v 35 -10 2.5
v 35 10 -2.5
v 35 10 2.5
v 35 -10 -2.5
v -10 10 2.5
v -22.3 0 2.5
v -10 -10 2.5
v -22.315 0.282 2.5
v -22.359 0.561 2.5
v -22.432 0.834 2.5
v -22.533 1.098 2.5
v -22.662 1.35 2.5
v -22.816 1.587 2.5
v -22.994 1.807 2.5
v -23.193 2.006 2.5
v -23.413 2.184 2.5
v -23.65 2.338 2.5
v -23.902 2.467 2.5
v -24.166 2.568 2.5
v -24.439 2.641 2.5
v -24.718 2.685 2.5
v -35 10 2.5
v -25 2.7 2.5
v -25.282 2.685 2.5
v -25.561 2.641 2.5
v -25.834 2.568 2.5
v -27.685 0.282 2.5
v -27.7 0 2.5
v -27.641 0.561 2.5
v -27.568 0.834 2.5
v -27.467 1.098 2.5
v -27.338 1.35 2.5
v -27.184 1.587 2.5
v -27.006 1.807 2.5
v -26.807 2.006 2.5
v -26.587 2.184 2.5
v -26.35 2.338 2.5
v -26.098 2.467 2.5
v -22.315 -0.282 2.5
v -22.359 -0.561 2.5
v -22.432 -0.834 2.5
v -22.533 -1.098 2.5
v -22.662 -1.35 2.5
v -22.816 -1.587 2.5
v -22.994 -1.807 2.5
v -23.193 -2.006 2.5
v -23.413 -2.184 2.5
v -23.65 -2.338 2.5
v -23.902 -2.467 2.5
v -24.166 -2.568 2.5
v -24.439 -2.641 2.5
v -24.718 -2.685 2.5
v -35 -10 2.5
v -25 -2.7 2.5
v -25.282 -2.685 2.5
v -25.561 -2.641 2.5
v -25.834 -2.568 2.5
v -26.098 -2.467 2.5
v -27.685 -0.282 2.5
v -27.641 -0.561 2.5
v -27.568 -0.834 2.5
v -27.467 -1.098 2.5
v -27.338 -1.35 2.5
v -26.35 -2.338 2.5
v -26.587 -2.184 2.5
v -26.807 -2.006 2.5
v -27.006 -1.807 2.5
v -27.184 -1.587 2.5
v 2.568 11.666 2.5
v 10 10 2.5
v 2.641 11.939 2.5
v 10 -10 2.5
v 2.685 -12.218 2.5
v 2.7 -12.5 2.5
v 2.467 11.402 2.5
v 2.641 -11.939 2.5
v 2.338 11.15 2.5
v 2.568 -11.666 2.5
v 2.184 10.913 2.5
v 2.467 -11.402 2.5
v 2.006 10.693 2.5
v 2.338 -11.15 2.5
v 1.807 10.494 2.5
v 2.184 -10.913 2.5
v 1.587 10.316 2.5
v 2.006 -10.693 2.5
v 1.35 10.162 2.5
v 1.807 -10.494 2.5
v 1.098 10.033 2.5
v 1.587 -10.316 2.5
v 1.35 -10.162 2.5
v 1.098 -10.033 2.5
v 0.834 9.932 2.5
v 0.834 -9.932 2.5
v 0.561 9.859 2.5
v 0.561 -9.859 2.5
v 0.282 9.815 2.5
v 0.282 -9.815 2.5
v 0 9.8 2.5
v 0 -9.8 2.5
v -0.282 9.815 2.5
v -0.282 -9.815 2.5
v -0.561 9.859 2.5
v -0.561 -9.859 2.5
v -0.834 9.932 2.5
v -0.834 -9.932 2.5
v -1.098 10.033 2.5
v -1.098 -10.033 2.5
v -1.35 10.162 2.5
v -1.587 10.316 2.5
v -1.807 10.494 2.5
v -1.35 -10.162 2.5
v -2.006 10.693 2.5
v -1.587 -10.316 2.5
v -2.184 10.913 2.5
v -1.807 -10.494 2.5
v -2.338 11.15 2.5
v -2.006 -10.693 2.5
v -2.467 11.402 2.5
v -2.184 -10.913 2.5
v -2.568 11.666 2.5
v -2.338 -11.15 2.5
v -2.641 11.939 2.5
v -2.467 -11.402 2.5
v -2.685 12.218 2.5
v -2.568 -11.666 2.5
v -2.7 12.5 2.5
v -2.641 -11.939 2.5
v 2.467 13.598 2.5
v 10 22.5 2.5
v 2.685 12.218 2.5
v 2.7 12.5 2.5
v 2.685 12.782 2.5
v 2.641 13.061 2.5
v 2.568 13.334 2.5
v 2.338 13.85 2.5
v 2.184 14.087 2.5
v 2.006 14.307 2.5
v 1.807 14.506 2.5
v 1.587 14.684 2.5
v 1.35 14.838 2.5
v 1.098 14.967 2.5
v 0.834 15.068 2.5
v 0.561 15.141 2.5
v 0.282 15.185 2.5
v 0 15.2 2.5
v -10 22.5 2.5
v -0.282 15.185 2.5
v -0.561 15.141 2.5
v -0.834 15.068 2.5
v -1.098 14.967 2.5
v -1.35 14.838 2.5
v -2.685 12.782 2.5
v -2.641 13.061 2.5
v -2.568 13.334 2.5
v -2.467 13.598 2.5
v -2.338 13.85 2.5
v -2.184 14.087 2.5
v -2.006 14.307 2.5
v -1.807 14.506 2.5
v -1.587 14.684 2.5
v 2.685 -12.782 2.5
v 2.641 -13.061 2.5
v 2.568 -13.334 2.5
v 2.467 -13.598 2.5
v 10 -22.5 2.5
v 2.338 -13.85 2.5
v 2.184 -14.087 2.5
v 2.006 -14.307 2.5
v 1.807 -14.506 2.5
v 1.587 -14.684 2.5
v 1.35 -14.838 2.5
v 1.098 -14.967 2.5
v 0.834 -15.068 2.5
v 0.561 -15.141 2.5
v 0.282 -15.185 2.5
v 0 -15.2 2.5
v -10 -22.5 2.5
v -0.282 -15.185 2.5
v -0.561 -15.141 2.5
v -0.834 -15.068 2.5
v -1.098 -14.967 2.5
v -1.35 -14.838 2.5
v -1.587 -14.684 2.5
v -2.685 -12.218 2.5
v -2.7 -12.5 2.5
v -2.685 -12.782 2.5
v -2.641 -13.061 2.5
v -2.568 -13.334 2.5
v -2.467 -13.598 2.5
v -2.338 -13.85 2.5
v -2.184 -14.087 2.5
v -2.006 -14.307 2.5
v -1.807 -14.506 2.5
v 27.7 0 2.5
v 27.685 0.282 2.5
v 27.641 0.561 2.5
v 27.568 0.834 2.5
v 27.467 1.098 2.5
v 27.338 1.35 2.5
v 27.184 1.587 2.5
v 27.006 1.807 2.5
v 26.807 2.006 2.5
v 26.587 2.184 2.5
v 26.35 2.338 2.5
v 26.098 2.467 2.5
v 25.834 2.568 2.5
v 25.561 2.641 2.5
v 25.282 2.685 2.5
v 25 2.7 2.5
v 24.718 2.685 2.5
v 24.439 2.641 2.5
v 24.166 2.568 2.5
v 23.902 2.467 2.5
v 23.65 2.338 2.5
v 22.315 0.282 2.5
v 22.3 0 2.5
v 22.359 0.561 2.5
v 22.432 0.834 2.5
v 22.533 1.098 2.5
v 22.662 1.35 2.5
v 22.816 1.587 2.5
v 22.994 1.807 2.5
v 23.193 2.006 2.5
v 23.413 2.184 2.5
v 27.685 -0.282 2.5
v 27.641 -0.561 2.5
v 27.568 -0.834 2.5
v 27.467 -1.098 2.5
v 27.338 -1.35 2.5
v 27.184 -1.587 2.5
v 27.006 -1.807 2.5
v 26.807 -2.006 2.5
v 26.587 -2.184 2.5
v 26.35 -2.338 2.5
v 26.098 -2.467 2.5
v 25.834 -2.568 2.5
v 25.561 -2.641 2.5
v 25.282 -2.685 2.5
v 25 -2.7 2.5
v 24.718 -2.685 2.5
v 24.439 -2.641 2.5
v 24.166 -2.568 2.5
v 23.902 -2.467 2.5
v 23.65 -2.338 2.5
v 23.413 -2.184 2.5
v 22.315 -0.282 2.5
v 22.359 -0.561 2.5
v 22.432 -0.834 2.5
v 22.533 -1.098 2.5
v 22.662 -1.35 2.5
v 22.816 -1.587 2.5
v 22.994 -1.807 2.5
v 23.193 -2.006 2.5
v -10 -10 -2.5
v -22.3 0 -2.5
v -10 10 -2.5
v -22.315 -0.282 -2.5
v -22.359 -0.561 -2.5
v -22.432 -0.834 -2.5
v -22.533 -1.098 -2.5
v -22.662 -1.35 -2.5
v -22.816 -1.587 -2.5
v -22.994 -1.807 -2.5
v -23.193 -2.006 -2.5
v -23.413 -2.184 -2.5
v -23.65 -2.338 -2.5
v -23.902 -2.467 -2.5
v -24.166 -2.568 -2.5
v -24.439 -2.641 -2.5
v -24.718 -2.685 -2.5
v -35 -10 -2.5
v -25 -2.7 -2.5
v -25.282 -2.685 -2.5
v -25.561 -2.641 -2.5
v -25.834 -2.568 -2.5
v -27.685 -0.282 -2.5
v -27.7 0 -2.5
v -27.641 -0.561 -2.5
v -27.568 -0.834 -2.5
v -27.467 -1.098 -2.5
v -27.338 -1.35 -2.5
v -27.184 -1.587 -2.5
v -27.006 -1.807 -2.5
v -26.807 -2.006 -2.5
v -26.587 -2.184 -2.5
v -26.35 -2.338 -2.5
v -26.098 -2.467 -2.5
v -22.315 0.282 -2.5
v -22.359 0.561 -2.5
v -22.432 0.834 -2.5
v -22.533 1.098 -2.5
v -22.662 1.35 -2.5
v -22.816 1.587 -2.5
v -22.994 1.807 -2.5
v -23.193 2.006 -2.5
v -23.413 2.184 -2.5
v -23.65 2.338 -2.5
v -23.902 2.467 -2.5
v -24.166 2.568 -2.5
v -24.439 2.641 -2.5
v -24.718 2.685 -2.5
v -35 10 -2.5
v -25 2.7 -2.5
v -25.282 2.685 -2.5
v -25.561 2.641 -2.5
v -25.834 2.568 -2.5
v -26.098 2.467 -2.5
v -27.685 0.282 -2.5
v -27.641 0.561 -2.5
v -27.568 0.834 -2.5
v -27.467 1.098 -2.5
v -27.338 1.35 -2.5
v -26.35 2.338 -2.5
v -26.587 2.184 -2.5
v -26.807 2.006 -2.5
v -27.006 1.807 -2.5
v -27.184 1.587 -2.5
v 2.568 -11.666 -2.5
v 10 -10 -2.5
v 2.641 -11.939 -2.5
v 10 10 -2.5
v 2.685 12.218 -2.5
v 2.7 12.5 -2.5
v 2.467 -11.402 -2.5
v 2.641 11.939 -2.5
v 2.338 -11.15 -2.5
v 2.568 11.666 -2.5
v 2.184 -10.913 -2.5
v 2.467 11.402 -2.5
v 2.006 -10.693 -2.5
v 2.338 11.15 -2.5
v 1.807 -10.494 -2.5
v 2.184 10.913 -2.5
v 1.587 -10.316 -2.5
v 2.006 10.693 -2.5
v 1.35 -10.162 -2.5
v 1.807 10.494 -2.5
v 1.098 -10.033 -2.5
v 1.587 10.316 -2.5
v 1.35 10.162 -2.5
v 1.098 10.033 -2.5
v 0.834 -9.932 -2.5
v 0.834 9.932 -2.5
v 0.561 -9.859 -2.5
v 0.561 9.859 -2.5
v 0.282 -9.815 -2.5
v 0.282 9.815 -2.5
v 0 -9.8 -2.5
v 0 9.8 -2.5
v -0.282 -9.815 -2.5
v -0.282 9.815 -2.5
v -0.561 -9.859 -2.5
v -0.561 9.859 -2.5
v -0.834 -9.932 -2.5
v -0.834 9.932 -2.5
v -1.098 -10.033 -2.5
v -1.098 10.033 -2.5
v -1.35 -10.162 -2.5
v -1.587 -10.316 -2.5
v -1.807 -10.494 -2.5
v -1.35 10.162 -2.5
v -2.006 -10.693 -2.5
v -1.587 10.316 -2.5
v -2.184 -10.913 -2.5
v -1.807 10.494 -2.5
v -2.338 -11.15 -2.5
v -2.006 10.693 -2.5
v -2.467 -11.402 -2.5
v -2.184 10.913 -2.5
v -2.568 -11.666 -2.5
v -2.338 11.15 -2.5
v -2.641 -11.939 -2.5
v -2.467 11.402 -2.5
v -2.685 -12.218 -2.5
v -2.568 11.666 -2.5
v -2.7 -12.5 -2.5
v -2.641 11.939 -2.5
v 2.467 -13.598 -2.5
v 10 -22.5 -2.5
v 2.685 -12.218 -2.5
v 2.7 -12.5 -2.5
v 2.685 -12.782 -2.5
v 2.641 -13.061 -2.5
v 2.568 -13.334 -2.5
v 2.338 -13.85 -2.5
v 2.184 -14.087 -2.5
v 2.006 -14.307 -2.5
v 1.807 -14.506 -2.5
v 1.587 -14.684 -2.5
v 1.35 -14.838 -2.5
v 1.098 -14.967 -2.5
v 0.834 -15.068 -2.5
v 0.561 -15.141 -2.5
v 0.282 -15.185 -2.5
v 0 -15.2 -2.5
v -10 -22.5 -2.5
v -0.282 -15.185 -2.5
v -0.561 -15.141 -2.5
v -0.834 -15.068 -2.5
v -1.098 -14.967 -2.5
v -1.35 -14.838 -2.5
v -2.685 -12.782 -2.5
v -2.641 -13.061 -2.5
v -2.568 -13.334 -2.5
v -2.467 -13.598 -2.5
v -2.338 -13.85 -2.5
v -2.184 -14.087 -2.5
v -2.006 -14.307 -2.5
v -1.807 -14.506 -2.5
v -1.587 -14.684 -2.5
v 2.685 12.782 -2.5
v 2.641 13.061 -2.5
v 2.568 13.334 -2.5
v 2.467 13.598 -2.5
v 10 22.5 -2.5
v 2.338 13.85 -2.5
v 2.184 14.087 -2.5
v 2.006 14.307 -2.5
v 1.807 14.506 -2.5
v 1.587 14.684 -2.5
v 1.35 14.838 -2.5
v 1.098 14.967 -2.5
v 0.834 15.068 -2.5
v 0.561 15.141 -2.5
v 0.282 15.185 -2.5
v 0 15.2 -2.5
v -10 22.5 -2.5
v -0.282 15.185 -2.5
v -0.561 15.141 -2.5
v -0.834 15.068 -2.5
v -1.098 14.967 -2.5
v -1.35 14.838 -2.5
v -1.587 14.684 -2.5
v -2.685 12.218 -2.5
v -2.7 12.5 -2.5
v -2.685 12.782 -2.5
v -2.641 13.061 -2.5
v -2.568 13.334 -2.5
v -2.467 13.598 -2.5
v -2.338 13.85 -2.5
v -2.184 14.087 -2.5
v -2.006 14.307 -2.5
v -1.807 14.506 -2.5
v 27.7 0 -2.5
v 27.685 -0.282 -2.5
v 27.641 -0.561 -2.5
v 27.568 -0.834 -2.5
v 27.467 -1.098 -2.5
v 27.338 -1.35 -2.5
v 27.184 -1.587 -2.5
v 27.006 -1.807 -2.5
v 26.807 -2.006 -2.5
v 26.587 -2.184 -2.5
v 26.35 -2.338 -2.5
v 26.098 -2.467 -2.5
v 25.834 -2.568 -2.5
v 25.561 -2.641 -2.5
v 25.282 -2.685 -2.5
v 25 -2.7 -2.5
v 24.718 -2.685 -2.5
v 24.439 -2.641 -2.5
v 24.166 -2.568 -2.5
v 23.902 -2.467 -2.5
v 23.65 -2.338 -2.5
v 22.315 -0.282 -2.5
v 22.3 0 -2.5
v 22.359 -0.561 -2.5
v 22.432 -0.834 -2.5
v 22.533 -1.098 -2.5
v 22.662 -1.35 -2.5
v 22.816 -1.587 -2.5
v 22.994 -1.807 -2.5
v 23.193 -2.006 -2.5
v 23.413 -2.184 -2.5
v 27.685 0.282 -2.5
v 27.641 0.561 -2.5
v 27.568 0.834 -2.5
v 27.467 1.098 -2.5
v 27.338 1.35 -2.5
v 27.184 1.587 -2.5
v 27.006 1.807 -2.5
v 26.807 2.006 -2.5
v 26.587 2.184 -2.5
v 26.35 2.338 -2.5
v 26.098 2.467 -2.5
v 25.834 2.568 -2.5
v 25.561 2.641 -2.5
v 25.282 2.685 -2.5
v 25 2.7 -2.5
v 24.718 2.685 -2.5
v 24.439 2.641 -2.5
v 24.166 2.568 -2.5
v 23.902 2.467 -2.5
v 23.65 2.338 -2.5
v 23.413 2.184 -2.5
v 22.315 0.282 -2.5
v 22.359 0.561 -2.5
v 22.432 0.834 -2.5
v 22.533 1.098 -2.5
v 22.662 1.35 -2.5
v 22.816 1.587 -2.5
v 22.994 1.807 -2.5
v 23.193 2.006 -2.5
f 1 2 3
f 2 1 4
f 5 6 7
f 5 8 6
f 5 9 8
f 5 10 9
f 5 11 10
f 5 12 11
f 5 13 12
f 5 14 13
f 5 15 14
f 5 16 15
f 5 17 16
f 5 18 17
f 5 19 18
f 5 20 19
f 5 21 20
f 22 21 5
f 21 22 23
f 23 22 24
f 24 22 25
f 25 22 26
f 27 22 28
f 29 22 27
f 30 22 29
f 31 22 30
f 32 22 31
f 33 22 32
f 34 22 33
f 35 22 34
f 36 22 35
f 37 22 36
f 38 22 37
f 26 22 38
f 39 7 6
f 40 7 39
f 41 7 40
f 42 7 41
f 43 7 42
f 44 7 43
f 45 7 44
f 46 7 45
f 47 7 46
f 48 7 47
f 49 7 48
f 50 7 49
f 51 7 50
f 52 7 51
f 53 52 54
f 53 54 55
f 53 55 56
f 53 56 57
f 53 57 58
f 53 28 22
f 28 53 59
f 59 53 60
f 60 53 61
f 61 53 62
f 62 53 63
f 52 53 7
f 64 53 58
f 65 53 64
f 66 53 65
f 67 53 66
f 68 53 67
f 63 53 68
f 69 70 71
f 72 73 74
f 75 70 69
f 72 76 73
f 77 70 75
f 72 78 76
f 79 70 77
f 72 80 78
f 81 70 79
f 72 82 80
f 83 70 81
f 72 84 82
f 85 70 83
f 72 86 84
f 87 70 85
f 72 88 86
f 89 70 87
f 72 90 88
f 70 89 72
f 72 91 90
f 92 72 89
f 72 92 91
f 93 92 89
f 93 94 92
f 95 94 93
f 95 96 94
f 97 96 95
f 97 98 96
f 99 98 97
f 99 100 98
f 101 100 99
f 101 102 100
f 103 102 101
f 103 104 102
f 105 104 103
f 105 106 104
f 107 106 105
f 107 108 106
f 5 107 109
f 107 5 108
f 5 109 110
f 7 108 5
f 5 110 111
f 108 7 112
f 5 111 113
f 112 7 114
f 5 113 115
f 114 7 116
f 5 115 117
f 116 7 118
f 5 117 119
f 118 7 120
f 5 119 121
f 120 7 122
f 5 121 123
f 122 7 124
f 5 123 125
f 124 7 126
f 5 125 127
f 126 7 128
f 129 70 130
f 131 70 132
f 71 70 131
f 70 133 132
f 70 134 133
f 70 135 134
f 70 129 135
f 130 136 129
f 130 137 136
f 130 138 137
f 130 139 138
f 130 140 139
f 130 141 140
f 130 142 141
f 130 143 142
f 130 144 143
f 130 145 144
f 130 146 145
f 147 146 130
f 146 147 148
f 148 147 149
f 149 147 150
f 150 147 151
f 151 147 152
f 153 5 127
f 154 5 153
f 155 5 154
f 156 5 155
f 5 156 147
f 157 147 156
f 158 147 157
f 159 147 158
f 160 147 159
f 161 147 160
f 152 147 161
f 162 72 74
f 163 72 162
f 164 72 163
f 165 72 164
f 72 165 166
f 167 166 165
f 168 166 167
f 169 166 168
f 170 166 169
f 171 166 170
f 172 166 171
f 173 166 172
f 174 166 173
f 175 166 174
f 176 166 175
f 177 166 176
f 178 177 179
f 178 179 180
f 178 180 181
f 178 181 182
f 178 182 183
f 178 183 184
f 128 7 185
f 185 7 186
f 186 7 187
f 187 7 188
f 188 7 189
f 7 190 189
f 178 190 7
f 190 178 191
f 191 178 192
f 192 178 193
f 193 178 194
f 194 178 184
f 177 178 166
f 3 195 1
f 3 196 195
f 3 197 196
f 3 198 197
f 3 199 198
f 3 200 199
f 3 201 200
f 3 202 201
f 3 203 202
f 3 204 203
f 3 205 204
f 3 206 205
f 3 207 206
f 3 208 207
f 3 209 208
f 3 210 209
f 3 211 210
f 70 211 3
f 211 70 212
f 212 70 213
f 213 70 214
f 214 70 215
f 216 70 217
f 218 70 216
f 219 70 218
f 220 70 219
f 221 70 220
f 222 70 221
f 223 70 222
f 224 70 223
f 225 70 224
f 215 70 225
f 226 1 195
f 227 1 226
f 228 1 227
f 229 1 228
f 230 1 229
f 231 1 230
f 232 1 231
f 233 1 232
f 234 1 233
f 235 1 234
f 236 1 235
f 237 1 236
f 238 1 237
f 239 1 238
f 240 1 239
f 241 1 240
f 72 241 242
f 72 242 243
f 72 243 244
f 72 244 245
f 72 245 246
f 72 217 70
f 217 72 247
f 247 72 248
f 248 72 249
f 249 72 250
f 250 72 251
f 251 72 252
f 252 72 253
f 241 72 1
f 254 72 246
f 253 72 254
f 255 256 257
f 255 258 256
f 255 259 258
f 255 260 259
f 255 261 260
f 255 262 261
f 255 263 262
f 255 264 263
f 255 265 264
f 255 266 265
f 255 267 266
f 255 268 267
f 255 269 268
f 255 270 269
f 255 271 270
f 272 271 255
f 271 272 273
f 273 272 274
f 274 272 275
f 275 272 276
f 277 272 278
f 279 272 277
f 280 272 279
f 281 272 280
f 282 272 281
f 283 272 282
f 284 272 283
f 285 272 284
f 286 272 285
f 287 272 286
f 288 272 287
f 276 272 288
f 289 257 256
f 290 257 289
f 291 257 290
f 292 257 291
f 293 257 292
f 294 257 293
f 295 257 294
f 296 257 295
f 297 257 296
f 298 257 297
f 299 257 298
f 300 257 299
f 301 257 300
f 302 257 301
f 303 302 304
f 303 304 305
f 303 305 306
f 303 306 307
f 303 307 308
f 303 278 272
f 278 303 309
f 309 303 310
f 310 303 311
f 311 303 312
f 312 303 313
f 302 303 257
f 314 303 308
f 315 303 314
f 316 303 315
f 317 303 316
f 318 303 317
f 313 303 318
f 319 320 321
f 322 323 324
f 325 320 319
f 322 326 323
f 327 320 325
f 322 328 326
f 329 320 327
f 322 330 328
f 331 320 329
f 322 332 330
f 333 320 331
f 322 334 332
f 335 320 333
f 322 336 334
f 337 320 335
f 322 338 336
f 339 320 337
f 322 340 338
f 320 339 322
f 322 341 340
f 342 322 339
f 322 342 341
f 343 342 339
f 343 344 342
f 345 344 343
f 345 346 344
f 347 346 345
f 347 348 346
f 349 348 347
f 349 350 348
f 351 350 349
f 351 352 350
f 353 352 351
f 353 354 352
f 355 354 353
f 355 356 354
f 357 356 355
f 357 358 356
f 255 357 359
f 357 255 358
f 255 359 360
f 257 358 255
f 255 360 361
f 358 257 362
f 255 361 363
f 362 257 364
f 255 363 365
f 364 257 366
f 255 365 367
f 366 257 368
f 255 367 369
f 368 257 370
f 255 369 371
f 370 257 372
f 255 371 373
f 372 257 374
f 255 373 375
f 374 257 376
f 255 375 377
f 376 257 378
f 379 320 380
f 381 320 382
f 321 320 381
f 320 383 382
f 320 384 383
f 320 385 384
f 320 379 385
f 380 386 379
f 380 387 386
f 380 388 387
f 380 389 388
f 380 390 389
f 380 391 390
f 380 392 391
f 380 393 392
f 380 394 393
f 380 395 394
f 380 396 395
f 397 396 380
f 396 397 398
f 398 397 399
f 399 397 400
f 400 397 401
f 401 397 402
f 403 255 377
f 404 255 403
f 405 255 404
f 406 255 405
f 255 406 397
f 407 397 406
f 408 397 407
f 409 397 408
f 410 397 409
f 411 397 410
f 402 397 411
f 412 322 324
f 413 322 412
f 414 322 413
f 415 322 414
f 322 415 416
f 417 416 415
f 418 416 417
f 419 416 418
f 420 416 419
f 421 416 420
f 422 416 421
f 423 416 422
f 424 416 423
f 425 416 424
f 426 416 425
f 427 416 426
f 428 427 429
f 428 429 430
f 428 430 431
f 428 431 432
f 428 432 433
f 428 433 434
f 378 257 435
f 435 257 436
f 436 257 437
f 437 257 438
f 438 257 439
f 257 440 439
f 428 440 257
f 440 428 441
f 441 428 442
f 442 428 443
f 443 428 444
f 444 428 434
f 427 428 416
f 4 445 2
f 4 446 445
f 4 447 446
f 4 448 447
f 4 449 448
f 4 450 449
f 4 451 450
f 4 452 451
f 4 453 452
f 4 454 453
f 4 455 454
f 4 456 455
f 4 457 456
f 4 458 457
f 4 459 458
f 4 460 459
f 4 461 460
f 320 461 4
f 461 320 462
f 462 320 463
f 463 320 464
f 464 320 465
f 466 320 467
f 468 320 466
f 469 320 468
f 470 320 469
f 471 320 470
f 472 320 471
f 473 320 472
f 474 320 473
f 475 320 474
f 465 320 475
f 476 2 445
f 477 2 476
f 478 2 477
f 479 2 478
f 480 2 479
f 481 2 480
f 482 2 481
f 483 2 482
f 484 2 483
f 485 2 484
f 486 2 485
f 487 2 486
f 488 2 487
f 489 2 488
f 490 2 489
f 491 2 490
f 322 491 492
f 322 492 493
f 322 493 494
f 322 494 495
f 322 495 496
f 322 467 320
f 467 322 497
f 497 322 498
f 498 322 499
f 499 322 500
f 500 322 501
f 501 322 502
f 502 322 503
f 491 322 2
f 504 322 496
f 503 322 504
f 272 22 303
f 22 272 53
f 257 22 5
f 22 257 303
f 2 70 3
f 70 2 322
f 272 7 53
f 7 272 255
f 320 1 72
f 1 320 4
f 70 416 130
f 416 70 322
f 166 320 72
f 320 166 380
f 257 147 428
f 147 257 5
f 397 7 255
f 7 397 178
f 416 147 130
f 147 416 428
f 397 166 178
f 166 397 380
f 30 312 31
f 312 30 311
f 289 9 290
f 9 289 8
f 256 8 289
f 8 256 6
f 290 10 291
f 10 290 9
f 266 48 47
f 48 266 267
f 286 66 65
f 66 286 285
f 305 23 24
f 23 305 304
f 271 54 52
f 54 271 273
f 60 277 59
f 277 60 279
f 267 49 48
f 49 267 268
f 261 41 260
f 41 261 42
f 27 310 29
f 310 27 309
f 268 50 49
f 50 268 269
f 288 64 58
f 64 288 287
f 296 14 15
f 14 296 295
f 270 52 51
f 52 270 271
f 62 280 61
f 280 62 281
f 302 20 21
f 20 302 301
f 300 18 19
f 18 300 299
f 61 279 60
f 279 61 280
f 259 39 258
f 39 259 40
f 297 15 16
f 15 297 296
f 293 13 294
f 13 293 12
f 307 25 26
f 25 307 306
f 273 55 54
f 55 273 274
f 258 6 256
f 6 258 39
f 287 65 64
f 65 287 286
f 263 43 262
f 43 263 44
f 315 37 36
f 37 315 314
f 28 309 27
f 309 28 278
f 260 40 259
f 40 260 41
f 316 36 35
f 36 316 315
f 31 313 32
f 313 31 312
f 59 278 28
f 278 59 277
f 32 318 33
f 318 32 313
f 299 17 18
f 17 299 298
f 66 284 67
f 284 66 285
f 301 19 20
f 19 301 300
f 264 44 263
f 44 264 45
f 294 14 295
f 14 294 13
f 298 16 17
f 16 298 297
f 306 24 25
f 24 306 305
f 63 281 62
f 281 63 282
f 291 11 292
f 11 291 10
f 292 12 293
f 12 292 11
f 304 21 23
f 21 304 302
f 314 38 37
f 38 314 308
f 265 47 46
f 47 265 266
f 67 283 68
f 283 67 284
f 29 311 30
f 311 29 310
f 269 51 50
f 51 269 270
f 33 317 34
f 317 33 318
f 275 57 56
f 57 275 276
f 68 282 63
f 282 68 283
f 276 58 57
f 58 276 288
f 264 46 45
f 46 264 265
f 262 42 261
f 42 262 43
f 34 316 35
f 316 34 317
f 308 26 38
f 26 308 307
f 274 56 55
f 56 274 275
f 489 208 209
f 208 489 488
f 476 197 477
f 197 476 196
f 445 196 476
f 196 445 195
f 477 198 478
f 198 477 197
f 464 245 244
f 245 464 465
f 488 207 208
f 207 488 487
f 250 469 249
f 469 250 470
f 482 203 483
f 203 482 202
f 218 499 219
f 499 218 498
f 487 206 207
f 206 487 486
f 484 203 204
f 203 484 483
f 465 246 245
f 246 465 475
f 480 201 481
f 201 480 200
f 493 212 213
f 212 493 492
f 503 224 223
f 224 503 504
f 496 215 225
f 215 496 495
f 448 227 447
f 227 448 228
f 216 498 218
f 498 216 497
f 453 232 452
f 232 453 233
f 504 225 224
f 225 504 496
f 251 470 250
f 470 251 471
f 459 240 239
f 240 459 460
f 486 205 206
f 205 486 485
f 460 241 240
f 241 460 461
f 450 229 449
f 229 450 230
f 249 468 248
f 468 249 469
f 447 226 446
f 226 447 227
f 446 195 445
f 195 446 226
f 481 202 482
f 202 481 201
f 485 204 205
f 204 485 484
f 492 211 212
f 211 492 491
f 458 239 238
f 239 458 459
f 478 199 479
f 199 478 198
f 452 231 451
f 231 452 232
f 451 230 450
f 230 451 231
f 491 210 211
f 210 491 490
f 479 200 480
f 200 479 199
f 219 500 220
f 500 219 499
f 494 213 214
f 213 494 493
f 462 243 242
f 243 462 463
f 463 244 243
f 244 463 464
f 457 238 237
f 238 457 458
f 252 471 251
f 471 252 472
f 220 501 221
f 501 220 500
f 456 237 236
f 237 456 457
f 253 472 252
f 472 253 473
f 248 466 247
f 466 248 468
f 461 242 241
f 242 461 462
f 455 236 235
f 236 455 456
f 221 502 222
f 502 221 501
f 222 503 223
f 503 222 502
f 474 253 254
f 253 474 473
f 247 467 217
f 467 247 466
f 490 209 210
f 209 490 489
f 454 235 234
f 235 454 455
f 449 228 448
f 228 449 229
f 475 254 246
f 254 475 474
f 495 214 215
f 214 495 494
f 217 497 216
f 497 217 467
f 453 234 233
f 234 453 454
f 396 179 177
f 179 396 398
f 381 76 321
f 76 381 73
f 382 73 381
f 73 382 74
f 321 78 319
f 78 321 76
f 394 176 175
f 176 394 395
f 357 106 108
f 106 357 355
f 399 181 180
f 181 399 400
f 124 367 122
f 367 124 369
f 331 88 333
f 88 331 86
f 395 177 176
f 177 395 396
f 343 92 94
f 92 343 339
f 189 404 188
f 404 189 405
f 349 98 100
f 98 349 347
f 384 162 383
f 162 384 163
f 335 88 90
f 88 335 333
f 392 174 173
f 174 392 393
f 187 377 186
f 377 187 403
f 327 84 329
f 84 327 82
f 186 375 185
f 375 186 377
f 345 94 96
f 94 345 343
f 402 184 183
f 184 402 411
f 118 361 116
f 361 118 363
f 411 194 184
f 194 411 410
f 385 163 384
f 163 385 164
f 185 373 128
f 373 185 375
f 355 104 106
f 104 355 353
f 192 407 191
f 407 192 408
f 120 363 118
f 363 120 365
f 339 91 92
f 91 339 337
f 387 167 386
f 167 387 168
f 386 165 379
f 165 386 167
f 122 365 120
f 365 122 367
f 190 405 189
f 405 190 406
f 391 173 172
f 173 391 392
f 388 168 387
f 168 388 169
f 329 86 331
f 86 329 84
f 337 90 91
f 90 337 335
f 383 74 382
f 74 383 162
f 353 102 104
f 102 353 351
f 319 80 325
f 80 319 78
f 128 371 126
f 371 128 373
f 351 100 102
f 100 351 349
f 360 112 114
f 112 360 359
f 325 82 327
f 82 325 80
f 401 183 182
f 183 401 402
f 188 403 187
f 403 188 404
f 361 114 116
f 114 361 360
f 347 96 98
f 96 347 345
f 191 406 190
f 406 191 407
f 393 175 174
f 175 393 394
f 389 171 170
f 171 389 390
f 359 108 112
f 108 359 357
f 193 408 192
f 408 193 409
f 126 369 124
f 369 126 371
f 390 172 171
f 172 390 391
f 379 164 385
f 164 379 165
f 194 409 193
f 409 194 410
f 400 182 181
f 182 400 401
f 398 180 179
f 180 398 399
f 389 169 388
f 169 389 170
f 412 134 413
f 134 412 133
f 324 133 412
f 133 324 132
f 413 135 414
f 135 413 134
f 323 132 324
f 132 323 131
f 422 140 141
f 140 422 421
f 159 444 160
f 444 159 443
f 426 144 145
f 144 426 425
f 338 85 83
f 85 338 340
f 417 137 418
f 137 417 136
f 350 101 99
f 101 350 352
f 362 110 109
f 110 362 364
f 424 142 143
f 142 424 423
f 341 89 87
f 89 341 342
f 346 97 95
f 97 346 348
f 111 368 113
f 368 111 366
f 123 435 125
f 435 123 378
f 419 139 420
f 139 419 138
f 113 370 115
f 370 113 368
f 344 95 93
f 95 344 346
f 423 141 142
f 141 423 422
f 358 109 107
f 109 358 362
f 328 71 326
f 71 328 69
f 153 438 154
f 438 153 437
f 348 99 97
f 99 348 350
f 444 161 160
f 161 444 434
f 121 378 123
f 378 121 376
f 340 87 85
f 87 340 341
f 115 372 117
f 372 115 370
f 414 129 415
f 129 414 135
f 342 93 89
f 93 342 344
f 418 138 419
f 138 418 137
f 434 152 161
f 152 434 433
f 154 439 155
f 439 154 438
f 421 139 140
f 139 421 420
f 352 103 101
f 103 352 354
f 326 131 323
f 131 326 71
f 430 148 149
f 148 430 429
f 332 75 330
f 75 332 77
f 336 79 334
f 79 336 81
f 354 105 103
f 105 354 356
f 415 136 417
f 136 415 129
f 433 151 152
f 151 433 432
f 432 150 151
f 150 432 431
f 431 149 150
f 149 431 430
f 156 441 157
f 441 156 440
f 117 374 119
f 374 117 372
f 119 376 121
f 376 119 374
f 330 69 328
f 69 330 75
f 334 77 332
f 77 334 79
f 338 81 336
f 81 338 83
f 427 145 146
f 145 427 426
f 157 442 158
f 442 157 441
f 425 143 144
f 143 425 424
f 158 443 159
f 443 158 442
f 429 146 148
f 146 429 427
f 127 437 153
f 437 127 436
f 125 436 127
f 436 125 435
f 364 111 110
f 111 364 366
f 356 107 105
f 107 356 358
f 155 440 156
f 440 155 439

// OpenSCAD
// T-shaped mounting plate.
$fn = 60;
eps = 0.02;
stem_l = 70;
arm_l = 45;
width = 20;
thickness = 5;
difference() {
    union() { cube([stem_l,width,thickness],center=true); cube([width,arm_l,thickness],center=true); }
    for (p=[[-stem_l/2+10,0],[stem_l/2-10,0],[0,-arm_l/2+10],[0,arm_l/2-10]]) translate([p[0],p[1],-thickness/2-eps]) cylinder(d=5.4,h=thickness+2*eps);
}
